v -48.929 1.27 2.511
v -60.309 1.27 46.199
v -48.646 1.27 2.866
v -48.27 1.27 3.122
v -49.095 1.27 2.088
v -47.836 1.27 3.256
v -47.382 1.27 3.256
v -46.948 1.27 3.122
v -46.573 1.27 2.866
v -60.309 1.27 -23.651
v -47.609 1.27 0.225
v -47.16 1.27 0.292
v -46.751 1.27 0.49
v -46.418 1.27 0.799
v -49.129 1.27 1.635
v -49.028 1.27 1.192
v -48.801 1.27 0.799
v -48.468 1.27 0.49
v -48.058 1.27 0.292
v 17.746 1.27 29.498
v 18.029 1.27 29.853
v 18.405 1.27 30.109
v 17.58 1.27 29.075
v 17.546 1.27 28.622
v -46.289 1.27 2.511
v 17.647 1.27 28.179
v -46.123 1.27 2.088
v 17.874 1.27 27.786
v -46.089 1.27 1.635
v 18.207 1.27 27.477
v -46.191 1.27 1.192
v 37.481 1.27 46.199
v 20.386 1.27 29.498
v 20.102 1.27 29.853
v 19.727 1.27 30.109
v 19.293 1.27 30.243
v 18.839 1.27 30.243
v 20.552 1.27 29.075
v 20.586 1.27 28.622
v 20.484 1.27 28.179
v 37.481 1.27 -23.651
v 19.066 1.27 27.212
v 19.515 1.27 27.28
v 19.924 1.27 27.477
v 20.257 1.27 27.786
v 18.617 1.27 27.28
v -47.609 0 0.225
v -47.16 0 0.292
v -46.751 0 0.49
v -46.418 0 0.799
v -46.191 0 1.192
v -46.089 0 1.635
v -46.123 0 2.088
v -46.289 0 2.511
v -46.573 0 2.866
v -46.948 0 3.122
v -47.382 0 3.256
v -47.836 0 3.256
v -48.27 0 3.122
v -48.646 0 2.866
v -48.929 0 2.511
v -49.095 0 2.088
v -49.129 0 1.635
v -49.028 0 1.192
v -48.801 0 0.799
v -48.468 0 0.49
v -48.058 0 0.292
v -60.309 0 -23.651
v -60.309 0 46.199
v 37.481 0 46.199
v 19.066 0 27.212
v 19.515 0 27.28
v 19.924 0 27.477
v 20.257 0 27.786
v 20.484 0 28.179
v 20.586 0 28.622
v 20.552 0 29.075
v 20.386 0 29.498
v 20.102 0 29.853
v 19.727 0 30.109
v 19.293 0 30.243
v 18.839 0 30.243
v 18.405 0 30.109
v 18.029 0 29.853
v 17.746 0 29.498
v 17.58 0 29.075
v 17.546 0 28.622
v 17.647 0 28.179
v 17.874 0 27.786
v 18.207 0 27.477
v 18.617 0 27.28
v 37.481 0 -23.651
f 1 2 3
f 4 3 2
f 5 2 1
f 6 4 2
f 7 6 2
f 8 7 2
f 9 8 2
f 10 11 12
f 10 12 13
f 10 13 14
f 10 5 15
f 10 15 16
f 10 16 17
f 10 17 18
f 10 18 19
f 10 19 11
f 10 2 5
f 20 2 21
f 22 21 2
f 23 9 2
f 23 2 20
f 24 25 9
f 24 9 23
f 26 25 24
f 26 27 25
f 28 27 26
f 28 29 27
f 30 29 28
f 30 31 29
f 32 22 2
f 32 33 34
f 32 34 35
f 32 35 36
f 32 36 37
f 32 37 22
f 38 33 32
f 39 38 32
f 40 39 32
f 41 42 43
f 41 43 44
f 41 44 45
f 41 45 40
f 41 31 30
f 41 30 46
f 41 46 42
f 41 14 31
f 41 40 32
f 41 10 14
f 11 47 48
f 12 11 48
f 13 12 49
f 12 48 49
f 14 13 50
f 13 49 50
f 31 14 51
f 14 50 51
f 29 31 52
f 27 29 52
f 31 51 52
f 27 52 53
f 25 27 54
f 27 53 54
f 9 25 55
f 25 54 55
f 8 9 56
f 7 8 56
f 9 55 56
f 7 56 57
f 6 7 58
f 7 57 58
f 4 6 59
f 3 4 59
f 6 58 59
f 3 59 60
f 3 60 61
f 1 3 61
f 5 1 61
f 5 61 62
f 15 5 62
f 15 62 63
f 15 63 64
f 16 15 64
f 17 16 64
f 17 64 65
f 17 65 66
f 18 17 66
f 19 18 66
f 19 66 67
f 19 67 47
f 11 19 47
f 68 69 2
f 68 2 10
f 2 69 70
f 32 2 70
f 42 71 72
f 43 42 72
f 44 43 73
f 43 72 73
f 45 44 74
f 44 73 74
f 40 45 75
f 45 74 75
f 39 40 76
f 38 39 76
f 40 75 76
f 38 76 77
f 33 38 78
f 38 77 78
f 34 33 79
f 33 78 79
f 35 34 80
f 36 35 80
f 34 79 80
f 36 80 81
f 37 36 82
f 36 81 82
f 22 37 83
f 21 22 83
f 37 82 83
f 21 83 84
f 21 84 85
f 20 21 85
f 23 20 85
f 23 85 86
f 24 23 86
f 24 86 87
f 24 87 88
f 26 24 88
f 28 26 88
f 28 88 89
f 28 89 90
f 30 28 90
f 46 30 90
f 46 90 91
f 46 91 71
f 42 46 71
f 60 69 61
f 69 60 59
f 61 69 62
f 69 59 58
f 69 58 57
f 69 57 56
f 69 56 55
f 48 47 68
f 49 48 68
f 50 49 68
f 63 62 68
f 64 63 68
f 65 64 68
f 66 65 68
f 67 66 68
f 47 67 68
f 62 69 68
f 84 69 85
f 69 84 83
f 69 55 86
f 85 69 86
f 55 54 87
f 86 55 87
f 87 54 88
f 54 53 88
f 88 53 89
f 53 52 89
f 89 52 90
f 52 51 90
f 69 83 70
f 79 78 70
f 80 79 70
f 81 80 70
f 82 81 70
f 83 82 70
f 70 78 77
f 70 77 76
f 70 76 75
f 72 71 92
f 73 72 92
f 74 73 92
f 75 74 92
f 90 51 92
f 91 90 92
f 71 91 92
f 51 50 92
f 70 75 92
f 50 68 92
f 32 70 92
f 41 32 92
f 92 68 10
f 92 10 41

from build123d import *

# Parameters (mm, degrees)
SKETCH1_W                       = 97.79
SKETCH1_H                       = 69.85
EXTRUDE1_DEPTH                  = 1.27
TAP_DRILL_FOR_4_HELICOIL1_D     = 3.048
TAP_DRILL_FOR_4_HELICOIL1_DEPTH = 25.4
TAP_DRILL_FOR_4_HELICOIL1_TIP   = 0.915711583


with BuildPart() as part:
    # Sketch1 → Extrude1 (new body)
    with BuildSketch(Plane(origin=(0, 0, 0), x_dir=(1, 0, 0), z_dir=(0, 1, 0))):
        with Locations((-11.414173127, -11.27370801)):
            Rectangle(SKETCH1_W, SKETCH1_H)
    extrude(amount=EXTRUDE1_DEPTH)

    # Tap Drill for #4 Helicoil1
    with Locations(Plane(origin=(19.065826873, 1.27, 28.73620801), x_dir=(0, 0, 1), z_dir=(0, 1, 0))):
        with Locations((0, 0), (-26.9875, -66.675)):
            Hole(TAP_DRILL_FOR_4_HELICOIL1_D / 2, depth=TAP_DRILL_FOR_4_HELICOIL1_DEPTH)
            with Locations((0, 0, -(TAP_DRILL_FOR_4_HELICOIL1_DEPTH + TAP_DRILL_FOR_4_HELICOIL1_TIP / 2))):  # 118° drill point
                Cone(0, TAP_DRILL_FOR_4_HELICOIL1_D / 2, TAP_DRILL_FOR_4_HELICOIL1_TIP, mode=Mode.SUBTRACT)


solid = part.part
